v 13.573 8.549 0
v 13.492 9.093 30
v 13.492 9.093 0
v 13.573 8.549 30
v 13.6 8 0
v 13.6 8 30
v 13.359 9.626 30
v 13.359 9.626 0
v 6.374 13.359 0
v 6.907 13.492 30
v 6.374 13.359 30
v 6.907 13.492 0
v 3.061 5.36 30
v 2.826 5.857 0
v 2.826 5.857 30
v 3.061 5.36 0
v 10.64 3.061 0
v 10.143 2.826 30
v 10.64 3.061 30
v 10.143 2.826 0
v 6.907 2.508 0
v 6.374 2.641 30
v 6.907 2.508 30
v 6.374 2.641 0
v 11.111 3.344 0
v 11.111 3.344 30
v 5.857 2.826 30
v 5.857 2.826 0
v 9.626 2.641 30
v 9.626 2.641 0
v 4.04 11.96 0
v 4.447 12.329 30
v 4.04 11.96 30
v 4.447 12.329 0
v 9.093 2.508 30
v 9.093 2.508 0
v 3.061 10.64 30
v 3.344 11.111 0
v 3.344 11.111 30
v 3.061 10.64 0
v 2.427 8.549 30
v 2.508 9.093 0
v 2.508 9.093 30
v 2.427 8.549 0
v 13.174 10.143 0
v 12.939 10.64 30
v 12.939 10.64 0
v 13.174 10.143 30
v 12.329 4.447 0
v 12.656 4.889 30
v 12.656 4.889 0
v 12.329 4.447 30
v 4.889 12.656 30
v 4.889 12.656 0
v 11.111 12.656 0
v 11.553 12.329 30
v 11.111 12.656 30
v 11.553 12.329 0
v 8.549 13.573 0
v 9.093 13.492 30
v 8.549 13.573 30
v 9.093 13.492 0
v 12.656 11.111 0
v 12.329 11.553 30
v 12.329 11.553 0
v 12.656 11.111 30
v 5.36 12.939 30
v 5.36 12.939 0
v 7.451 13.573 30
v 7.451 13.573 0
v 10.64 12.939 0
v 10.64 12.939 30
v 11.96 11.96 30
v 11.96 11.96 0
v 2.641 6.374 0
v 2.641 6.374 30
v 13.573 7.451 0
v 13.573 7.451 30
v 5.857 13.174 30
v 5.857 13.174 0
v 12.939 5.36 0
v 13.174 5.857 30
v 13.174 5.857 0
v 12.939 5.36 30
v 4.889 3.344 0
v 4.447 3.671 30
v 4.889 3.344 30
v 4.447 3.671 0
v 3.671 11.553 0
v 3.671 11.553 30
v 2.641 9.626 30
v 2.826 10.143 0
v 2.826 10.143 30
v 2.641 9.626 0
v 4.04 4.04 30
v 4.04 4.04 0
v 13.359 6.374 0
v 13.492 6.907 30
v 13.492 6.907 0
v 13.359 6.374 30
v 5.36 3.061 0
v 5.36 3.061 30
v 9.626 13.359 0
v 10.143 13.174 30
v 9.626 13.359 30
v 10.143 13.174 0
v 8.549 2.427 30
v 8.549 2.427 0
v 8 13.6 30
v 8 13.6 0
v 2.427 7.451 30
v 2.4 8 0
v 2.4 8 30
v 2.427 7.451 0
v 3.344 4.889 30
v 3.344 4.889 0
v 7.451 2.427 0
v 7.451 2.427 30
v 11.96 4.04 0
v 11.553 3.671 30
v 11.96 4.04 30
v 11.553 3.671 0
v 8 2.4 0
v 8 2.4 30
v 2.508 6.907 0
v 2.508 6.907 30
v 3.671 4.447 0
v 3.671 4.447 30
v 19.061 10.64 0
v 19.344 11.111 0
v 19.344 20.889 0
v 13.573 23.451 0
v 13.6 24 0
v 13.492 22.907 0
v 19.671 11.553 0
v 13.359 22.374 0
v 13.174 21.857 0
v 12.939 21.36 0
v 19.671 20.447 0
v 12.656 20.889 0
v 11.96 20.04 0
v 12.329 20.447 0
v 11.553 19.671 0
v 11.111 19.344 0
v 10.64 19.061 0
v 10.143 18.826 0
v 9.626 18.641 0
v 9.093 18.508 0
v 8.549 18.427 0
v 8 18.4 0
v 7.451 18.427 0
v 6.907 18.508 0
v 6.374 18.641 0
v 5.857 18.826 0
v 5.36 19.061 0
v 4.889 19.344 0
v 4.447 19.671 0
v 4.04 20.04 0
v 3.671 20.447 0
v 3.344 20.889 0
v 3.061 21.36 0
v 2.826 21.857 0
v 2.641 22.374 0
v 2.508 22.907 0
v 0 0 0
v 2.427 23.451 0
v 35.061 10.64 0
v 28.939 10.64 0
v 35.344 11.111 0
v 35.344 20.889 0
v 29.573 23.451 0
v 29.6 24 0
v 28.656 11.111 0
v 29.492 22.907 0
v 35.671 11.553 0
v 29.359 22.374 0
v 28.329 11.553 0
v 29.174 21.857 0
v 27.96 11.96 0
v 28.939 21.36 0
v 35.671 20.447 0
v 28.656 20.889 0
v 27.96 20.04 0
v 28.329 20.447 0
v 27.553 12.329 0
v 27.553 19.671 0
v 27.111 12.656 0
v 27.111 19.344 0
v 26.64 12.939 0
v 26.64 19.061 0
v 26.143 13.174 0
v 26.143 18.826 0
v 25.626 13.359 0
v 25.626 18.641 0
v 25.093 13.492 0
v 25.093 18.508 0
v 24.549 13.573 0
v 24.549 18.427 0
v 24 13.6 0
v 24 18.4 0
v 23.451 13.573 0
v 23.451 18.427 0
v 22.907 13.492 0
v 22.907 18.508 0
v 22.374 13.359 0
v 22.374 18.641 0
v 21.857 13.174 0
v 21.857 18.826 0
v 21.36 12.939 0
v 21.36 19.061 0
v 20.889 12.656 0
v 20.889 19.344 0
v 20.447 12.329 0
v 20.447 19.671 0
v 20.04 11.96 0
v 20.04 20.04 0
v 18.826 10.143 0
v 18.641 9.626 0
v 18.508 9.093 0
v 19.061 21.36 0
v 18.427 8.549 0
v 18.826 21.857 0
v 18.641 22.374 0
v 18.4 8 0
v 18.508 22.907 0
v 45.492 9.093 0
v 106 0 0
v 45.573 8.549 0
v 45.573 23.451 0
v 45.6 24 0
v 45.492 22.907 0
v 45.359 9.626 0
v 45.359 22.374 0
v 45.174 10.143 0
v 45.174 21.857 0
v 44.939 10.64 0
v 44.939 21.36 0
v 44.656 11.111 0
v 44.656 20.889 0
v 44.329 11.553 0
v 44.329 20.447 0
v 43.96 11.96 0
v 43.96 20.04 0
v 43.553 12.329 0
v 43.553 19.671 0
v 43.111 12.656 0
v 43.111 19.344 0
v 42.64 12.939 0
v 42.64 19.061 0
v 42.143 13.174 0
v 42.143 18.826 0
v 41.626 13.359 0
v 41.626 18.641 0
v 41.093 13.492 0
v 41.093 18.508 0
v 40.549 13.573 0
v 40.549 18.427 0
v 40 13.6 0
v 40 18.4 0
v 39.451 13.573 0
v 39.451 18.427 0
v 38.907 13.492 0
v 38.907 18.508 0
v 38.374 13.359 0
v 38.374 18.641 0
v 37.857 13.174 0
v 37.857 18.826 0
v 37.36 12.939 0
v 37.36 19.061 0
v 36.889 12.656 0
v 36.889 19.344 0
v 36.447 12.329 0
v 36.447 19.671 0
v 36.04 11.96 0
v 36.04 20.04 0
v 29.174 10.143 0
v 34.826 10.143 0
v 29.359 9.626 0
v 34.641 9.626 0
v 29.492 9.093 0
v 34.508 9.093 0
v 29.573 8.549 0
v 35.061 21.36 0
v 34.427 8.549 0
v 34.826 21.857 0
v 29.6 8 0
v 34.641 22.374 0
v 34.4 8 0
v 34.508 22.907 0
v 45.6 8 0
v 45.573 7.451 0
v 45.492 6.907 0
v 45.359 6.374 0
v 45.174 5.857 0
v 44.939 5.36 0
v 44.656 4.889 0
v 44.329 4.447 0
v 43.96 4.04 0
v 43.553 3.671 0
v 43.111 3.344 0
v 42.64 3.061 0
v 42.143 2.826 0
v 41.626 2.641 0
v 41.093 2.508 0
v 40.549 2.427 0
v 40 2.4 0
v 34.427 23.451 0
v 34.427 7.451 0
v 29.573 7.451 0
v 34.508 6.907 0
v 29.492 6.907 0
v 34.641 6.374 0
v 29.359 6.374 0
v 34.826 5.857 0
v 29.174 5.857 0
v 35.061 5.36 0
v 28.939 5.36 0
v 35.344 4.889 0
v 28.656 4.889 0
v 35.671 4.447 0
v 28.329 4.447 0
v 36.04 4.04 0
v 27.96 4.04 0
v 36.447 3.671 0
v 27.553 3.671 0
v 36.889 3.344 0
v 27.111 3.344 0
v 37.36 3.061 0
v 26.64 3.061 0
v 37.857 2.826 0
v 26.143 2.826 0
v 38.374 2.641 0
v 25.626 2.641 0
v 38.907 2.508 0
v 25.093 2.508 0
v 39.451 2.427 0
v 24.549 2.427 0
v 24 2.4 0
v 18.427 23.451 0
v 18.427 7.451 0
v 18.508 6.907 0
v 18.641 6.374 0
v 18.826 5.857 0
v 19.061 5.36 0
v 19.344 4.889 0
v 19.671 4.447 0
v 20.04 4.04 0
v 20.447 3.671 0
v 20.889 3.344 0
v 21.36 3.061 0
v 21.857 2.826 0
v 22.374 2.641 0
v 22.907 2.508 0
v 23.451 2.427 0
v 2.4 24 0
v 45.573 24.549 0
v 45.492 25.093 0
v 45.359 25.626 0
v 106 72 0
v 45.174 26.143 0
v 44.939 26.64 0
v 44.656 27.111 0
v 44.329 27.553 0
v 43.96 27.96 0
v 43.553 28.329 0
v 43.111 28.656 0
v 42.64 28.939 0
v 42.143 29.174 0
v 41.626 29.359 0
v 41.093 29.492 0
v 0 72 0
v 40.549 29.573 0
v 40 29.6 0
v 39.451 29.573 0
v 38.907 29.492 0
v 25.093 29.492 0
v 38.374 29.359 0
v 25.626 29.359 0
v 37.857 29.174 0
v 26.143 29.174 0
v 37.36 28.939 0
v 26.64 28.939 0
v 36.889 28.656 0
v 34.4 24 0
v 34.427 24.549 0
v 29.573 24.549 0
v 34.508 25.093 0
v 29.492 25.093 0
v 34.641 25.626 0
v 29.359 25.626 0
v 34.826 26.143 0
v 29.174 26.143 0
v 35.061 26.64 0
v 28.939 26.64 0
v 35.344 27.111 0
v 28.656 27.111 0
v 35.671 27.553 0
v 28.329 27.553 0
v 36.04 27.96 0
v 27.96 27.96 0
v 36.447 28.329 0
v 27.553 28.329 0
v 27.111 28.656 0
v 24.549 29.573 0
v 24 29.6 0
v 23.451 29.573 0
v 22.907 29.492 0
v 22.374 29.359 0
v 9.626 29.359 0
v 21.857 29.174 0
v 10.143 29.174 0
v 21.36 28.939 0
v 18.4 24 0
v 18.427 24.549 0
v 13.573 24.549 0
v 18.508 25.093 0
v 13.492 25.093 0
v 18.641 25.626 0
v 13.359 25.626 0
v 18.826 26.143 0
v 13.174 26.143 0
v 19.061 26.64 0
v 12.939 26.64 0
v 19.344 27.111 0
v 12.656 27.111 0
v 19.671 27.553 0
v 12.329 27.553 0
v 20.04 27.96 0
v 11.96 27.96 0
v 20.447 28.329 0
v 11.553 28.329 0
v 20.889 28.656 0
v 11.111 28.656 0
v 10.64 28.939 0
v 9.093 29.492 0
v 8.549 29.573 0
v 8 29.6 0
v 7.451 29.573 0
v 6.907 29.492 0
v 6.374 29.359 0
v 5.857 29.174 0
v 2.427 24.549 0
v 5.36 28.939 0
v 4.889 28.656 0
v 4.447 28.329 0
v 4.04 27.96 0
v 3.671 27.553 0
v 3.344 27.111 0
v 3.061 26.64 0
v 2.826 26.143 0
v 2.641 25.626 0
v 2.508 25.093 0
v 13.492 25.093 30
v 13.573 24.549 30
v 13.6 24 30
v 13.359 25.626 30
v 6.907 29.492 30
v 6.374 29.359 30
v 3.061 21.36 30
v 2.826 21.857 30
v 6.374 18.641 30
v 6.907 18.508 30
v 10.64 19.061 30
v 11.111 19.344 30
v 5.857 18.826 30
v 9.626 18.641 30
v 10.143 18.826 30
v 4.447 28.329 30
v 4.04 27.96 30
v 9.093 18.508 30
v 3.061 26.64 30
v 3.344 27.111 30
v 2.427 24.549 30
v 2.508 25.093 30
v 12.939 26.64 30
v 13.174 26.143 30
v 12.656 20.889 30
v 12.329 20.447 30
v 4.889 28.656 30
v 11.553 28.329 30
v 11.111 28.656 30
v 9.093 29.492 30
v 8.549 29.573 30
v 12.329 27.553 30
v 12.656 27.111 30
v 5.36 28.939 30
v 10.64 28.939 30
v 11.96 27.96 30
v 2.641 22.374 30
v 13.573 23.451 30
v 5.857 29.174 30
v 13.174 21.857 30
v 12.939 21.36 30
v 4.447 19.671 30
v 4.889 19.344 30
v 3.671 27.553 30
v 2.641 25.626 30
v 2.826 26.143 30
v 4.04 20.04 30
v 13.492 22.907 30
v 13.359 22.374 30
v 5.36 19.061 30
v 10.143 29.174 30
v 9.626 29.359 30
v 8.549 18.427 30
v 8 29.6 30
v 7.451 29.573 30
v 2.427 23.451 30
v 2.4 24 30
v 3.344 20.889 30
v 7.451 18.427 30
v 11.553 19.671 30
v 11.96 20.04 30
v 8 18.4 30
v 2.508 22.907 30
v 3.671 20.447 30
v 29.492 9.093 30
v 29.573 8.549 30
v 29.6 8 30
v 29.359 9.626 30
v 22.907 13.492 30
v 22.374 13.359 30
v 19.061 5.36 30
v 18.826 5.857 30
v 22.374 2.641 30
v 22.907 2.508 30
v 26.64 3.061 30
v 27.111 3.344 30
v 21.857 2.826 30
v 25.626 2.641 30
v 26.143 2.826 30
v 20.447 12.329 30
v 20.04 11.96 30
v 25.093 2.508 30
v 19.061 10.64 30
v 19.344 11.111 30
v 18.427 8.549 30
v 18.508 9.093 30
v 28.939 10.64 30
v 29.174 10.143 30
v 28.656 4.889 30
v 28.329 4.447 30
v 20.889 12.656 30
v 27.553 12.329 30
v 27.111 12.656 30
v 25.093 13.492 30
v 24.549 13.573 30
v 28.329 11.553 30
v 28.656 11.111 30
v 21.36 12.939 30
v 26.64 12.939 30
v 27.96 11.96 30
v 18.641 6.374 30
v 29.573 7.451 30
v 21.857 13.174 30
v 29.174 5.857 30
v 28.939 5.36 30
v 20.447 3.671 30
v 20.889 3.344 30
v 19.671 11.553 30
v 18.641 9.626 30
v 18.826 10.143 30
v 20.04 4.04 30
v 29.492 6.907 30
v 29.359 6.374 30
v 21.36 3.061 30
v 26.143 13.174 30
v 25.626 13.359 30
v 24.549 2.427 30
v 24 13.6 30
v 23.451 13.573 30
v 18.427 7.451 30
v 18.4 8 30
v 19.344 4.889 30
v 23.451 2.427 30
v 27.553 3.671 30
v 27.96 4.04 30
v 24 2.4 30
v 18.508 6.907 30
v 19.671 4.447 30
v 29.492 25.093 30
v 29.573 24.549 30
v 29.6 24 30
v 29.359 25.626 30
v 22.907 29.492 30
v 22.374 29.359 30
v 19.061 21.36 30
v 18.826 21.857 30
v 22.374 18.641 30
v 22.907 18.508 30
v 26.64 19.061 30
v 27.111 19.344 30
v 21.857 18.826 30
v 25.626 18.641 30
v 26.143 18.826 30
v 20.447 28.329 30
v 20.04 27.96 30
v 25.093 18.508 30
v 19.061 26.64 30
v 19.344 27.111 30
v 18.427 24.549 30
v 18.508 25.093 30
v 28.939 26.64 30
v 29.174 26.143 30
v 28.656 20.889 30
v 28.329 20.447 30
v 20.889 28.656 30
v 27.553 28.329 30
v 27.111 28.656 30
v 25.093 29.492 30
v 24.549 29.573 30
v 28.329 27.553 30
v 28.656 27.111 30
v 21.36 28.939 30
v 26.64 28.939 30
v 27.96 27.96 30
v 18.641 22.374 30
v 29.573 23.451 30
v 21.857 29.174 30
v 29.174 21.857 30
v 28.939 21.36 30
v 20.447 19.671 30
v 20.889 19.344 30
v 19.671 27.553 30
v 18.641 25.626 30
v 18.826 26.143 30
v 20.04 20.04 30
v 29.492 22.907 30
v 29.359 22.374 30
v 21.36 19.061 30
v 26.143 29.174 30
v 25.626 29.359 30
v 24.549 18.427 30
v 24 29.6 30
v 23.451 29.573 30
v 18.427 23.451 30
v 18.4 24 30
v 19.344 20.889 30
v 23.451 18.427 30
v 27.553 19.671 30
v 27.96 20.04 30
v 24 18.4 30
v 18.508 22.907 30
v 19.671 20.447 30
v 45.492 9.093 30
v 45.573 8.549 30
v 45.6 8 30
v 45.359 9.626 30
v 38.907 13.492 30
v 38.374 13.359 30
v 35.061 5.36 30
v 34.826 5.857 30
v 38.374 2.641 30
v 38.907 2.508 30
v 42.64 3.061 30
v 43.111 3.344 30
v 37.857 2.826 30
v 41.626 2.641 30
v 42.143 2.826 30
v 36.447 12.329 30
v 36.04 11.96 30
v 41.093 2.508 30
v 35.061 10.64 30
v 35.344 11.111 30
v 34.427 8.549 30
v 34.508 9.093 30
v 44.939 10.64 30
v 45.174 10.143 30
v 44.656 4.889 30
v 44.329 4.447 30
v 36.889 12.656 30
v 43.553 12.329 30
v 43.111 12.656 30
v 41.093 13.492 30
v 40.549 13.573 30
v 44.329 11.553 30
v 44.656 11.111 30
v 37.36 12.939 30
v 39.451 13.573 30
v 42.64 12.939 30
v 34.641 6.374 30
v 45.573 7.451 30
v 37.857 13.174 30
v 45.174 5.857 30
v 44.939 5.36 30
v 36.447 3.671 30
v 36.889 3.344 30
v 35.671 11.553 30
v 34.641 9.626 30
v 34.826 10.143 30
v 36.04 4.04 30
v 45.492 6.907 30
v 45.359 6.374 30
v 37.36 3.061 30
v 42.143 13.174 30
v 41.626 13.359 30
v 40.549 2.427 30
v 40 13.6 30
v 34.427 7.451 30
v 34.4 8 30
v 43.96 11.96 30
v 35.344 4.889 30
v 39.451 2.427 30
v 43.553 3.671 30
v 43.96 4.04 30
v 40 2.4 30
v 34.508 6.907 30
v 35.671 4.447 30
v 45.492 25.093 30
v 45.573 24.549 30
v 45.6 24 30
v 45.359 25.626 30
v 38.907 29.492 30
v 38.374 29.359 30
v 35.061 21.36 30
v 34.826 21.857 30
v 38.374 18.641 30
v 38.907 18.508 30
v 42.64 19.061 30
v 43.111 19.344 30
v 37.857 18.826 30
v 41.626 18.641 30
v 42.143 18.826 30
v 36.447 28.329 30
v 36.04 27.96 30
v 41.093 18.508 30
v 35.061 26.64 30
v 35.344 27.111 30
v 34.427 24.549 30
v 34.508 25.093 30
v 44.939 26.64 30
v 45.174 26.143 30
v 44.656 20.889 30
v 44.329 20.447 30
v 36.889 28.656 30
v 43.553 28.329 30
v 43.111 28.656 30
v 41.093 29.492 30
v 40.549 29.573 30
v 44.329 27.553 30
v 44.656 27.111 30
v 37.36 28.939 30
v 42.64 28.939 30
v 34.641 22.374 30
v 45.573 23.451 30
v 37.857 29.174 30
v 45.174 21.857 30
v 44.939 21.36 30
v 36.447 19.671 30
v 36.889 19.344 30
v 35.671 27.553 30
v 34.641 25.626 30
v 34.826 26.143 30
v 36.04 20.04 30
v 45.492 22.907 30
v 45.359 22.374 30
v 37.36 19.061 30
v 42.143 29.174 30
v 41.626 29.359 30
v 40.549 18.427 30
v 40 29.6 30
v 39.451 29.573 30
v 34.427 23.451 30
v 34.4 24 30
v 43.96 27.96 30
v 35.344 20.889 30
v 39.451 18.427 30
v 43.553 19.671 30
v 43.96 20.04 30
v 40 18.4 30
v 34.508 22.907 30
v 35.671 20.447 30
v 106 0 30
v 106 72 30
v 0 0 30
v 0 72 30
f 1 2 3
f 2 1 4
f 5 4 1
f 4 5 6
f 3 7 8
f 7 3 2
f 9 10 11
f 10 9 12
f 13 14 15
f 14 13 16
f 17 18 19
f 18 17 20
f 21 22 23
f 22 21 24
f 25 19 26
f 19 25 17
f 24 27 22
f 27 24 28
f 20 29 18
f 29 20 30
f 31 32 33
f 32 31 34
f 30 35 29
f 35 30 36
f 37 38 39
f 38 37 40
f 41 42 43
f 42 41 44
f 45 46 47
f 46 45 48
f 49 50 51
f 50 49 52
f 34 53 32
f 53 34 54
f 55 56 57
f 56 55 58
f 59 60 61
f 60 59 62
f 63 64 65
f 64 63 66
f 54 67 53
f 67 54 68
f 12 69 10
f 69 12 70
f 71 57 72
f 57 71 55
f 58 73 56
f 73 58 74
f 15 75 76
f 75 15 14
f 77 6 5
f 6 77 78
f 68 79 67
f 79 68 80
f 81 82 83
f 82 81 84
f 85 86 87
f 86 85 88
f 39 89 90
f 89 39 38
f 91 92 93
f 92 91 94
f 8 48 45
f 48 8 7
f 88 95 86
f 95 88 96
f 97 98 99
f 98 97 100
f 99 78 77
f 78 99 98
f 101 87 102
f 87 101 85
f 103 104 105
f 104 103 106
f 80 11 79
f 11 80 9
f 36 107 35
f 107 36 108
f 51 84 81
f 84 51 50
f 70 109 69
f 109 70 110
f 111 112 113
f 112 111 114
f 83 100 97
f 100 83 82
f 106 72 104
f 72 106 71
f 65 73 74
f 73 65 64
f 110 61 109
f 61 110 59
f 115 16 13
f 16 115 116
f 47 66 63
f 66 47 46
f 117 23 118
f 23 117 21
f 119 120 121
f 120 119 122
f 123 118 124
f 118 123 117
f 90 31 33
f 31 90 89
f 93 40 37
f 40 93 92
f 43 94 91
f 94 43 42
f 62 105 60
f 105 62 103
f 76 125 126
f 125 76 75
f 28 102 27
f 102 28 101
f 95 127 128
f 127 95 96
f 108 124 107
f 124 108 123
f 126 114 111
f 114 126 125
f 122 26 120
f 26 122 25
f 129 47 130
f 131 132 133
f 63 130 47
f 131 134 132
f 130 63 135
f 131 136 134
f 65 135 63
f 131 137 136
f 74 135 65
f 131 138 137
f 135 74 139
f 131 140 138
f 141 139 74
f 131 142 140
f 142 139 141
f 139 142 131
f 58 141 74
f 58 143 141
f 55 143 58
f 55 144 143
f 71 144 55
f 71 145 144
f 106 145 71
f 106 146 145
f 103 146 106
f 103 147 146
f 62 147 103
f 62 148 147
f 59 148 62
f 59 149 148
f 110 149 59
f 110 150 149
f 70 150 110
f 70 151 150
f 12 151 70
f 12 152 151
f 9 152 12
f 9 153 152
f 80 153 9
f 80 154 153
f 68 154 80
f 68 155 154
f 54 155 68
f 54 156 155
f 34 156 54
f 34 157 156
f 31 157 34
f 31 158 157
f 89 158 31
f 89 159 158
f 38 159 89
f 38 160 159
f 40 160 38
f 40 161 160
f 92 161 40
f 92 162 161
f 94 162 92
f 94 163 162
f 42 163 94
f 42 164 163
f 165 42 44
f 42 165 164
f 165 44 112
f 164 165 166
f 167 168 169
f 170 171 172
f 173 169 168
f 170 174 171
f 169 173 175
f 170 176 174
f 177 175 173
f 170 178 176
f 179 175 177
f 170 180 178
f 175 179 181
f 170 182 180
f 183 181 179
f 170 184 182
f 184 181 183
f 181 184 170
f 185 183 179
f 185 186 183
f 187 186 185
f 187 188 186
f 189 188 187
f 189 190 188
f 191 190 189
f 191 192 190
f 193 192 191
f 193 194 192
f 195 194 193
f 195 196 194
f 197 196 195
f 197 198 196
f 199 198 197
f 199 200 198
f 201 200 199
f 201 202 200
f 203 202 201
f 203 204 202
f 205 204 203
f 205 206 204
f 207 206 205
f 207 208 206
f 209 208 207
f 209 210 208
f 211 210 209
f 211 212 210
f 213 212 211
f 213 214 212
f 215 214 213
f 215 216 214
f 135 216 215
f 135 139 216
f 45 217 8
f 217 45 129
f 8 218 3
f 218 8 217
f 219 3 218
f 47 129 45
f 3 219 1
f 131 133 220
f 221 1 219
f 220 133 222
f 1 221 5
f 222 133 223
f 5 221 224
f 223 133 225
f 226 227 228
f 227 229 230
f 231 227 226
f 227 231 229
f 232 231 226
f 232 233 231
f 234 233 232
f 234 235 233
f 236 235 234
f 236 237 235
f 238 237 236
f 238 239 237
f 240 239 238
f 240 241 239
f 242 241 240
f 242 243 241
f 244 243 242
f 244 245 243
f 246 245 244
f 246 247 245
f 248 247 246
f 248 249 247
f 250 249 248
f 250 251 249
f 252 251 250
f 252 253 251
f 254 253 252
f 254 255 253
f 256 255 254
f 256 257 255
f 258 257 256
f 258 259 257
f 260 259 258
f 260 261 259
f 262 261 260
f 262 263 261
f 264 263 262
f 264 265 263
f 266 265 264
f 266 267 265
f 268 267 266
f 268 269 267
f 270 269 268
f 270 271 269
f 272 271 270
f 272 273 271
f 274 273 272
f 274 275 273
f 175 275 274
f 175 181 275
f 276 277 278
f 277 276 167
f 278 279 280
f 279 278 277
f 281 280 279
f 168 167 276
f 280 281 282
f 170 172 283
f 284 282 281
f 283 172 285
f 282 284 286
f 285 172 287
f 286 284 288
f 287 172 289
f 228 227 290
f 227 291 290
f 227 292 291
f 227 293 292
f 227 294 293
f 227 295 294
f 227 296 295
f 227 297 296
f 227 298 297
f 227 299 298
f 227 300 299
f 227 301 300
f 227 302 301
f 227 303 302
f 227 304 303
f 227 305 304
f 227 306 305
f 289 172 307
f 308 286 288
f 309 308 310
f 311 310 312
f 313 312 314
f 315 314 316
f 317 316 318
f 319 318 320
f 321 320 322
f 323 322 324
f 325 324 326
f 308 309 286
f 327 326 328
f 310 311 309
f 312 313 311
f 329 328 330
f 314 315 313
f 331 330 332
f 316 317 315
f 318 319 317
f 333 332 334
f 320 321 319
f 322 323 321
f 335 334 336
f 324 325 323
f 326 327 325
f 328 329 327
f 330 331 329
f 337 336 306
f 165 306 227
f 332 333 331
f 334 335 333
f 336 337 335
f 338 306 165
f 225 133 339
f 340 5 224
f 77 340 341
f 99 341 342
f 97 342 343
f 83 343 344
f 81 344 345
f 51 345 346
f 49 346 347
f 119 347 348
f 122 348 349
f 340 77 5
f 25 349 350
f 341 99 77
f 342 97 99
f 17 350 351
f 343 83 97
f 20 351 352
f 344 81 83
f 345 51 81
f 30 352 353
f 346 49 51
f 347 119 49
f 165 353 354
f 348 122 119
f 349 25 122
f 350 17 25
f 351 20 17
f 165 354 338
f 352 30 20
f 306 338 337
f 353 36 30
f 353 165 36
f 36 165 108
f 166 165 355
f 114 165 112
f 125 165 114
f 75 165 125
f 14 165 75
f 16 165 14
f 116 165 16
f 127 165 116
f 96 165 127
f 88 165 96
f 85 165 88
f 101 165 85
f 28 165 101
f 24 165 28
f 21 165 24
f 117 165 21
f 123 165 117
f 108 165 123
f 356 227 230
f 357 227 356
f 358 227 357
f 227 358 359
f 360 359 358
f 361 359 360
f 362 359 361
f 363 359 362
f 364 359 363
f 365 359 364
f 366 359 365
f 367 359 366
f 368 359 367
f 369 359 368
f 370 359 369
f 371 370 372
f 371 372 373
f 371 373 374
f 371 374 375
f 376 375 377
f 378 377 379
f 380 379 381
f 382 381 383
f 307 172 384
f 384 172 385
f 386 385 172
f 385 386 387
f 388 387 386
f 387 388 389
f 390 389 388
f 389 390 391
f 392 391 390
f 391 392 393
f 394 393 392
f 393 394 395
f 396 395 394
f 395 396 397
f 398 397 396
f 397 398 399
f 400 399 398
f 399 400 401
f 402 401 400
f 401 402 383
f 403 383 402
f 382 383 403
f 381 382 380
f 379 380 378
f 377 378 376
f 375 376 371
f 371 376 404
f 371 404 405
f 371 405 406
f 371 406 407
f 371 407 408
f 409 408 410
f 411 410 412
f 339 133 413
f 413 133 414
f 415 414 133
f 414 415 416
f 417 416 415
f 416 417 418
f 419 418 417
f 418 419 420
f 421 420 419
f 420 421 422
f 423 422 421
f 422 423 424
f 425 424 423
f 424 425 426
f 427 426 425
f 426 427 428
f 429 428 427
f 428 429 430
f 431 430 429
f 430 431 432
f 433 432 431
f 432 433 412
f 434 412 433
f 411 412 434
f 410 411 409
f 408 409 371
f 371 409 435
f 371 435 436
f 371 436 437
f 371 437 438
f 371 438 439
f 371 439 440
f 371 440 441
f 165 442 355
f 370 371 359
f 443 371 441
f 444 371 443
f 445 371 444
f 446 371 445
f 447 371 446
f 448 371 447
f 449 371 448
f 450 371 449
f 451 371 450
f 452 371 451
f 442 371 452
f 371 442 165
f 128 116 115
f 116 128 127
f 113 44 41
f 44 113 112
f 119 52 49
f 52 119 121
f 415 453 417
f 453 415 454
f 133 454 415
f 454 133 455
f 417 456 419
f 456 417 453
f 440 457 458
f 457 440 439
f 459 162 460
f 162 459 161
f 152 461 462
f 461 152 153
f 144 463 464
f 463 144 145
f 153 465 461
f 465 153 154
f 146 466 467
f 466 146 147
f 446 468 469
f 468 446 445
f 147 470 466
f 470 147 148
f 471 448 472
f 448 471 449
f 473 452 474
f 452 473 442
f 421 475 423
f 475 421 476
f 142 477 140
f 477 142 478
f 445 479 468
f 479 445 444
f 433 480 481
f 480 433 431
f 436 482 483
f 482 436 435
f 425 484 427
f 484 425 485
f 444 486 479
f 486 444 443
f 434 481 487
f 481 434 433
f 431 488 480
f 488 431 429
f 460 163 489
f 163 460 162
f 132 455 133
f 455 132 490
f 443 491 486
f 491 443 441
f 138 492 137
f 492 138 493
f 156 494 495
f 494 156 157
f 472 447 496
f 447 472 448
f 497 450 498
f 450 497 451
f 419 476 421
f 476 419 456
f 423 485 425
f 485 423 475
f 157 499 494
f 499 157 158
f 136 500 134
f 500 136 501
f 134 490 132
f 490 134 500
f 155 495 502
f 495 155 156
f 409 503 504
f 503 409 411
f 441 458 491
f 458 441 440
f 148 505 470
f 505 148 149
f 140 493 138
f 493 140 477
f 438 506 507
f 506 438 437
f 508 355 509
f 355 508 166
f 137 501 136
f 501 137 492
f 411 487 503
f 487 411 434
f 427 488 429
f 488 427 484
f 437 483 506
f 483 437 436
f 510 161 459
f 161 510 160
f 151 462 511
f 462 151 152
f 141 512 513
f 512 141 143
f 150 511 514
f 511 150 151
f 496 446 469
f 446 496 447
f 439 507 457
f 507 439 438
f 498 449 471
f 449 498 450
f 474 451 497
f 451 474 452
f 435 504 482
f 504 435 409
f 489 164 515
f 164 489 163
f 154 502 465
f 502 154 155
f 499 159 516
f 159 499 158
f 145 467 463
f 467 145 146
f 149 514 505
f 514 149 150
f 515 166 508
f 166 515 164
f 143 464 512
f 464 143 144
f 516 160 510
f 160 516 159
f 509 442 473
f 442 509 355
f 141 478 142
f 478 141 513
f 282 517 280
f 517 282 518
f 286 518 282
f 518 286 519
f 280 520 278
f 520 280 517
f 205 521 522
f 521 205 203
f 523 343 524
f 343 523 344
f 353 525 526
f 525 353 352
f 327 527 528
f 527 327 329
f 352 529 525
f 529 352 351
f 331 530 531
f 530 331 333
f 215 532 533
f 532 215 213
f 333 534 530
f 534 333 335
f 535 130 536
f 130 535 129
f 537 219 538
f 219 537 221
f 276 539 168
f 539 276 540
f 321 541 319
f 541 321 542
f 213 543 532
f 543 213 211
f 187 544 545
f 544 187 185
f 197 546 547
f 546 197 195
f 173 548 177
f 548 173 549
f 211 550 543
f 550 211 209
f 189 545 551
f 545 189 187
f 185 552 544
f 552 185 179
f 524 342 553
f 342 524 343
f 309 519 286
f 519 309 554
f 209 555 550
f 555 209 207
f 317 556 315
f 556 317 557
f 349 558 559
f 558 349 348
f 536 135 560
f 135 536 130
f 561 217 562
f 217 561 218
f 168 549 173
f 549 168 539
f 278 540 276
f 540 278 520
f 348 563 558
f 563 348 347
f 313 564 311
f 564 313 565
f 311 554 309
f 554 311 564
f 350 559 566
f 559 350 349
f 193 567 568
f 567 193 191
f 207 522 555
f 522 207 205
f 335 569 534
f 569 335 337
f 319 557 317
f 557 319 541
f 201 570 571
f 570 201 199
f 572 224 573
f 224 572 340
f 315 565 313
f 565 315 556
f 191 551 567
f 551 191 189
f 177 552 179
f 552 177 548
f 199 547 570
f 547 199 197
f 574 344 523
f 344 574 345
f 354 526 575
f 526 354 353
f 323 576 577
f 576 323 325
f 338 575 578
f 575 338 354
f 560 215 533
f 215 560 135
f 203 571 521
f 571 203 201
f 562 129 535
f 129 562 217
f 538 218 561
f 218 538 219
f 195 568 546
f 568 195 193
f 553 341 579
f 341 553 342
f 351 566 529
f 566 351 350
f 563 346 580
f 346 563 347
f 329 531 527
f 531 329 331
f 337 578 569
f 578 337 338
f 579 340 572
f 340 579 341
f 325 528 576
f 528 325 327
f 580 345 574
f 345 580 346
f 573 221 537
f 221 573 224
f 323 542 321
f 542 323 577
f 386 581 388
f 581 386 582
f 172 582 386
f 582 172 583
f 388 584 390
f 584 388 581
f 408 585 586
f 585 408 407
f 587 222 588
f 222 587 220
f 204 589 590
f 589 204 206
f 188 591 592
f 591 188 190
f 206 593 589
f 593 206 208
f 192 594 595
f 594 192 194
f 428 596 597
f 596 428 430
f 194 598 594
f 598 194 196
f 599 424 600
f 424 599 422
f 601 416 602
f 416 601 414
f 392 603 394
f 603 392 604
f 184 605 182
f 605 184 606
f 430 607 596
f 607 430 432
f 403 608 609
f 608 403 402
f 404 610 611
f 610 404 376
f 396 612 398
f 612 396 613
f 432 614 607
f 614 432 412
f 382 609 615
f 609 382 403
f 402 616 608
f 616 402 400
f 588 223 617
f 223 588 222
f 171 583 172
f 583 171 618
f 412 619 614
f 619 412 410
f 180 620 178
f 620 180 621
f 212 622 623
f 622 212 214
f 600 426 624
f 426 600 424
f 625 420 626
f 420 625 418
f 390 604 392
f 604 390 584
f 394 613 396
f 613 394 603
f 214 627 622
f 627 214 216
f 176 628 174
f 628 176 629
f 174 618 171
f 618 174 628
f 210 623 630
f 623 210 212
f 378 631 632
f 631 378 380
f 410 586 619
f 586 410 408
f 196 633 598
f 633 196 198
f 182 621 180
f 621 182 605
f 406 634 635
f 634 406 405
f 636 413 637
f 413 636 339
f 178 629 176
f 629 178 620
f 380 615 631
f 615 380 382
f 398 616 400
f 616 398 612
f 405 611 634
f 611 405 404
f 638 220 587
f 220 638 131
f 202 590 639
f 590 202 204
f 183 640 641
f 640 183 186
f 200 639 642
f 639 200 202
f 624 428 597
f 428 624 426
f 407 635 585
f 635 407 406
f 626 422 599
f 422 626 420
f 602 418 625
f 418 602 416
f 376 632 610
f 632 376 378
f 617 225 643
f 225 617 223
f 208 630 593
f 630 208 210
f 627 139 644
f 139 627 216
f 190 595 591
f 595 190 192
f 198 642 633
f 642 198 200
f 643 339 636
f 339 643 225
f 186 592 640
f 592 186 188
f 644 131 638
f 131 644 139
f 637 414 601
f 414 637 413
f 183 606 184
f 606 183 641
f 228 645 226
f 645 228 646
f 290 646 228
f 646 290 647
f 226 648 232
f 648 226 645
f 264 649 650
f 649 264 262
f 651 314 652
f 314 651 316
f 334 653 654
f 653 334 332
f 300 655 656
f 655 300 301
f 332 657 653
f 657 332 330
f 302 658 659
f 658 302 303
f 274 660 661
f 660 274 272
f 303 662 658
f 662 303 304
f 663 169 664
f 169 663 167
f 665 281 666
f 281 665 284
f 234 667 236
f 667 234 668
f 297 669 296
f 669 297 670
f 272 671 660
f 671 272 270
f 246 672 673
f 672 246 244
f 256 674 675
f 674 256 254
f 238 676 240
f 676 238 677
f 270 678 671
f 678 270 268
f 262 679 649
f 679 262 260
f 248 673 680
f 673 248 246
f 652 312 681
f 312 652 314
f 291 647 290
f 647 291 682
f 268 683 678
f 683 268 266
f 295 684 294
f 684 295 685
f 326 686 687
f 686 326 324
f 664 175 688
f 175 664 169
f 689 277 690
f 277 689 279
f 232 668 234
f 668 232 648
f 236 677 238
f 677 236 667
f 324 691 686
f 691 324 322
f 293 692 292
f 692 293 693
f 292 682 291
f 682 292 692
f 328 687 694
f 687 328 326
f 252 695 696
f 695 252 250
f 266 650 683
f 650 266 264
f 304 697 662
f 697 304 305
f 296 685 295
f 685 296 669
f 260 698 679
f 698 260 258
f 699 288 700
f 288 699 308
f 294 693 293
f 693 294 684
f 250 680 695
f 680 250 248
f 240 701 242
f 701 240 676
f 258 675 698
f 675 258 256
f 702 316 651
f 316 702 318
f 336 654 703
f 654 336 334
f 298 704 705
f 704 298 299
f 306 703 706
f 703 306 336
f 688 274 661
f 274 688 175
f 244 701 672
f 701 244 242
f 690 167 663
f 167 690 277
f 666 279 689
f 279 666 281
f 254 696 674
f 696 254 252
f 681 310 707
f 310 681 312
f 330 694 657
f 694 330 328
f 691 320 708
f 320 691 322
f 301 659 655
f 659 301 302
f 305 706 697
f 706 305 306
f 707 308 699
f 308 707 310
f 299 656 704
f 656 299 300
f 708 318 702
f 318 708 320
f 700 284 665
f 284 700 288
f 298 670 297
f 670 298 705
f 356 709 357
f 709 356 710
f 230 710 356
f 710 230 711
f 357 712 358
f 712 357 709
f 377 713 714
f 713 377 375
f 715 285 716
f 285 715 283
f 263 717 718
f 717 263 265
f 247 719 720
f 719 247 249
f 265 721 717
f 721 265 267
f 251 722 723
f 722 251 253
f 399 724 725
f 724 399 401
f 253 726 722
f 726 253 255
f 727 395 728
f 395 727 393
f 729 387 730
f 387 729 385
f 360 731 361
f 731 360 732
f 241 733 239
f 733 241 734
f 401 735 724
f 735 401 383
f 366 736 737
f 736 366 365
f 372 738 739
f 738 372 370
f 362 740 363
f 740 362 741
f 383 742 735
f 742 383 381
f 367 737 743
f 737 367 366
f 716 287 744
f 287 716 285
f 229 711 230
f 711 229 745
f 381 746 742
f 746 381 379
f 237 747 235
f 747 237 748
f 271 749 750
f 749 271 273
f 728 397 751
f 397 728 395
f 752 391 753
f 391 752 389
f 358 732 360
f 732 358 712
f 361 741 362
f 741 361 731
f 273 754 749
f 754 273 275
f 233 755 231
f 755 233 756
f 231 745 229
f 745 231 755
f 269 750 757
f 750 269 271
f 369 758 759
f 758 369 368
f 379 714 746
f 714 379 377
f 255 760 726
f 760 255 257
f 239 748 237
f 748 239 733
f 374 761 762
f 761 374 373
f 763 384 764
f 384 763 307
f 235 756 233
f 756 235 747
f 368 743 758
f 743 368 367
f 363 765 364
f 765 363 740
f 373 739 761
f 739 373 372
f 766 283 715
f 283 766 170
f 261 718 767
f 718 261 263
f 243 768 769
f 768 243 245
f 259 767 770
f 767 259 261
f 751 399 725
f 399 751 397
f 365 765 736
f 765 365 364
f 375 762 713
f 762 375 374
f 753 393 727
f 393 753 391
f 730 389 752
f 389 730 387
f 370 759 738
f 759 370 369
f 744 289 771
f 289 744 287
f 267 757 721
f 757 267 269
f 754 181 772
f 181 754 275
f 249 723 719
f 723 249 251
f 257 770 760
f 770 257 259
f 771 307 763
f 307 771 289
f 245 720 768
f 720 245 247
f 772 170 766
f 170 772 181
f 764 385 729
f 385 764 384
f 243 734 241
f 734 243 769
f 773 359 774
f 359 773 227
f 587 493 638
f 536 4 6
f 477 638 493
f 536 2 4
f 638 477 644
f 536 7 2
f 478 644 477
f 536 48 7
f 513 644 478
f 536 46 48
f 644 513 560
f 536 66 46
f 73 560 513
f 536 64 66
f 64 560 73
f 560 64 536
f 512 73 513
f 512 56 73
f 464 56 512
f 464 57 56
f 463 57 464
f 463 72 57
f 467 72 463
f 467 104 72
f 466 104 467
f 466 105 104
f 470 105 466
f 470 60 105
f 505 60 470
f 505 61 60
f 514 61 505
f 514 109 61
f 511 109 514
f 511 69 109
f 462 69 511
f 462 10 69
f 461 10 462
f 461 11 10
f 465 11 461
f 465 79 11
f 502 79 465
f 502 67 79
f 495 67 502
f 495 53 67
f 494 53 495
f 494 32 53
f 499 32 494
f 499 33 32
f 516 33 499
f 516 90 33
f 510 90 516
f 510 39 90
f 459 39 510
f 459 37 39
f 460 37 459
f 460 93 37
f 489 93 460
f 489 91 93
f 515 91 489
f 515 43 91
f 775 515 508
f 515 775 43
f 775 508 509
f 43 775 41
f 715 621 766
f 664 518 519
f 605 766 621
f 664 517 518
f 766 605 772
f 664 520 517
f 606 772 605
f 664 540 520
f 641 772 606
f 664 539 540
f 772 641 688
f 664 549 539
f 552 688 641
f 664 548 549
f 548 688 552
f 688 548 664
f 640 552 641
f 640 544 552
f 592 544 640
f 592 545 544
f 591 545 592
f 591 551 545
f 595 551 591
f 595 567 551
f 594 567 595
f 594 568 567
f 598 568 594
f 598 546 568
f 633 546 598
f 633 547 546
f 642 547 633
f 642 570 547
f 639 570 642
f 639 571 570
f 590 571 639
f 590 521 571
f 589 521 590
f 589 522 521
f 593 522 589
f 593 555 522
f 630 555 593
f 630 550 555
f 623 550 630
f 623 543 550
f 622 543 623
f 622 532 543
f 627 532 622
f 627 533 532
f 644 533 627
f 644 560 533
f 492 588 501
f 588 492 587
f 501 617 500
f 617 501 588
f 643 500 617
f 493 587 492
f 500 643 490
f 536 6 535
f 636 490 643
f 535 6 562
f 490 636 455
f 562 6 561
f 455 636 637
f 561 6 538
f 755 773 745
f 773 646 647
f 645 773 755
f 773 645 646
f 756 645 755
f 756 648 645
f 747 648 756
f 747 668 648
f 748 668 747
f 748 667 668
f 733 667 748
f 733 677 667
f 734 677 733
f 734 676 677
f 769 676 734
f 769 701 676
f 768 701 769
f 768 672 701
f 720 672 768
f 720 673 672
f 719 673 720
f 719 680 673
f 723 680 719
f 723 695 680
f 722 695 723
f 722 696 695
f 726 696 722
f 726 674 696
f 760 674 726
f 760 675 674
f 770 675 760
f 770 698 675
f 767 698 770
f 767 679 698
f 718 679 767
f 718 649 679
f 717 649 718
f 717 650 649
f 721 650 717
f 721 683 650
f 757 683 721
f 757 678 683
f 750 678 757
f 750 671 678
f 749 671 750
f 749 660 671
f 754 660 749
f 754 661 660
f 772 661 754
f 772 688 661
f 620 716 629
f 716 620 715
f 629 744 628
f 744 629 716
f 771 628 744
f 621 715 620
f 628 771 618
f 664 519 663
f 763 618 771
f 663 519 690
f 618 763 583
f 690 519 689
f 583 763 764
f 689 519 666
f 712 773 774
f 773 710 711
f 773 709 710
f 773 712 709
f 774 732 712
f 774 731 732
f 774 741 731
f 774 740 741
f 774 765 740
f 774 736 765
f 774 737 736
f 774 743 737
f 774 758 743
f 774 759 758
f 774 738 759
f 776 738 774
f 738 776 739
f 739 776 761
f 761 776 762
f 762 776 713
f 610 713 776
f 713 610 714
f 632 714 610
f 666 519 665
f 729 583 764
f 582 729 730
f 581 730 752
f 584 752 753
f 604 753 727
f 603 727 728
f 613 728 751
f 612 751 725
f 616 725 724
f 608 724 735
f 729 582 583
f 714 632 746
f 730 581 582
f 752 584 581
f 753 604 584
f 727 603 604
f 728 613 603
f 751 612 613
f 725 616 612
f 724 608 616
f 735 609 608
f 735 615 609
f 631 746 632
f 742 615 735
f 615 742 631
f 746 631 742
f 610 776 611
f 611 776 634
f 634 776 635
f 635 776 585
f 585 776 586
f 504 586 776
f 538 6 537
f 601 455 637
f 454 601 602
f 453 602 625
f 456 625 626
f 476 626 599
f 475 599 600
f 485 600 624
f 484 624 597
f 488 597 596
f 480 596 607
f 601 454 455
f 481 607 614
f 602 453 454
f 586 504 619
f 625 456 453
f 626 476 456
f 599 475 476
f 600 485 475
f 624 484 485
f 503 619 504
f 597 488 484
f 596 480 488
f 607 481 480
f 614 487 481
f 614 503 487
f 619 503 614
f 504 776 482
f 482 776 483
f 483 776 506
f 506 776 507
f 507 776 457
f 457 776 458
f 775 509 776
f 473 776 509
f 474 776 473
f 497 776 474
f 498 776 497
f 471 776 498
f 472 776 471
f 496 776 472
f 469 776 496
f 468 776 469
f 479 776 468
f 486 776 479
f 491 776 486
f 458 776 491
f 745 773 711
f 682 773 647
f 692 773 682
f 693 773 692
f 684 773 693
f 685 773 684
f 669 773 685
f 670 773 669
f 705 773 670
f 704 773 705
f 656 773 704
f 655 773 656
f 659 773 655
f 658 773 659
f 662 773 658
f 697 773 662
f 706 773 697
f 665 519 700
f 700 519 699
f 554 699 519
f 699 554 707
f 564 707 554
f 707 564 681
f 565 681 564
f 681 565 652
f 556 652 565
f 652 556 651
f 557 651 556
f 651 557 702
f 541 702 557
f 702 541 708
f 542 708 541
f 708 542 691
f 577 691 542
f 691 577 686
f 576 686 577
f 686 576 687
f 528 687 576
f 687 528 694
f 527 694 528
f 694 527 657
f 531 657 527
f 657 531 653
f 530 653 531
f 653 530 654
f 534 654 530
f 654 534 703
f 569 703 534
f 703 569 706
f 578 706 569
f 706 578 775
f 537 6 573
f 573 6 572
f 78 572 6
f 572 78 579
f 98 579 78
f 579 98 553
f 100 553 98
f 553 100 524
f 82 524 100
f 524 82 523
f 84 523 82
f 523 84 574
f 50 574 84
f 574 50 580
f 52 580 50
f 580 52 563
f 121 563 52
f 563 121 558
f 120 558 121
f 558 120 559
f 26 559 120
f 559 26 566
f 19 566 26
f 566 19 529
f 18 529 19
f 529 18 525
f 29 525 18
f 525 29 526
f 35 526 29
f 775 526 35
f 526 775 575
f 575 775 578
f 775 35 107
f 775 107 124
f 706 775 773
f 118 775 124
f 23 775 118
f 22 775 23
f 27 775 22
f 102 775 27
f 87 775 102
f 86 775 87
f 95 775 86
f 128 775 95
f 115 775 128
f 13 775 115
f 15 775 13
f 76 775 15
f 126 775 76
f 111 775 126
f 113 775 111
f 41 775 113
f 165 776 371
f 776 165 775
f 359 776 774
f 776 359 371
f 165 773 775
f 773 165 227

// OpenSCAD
// Bench rack for 1.5 mL microcentrifuge tubes
// Dimensions and parameters
block_length = 106;    // X dimension (mm)
block_width  = 72;     // Y dimension (mm)
block_height = 30;     // Z dimension (mm)
hole_diameter = 11.2;  // Hole diameter (mm)
hole_depth = 25;       // Hole depth (mm)
floor_thickness = 5;   // Solid floor thickness (mm)
rows = 4;              // Number of rows (along Y)
cols = 6;              // Number of columns (along X)
hole_pitch_x = 16;     // Centre-to-centre spacing in X (mm)
hole_pitch_y = 16;     // Centre-to-centre spacing in Y (mm)

// Calculate hole positions (centred on block)
// Total grid dimensions
grid_width_x = (cols - 1) * hole_pitch_x;
grid_width_y = (rows - 1) * hole_pitch_y;

// Offset from block centre to first hole centre
offset_x = -grid_width_x / 2;
offset_y = -grid_width_y / 2;

// Hole height (from bottom of block)
hole_bottom_z = floor_thickness;
hole_top_z = hole_bottom_z + hole_depth;

// Block centre offsets
block_half_x = block_length / 2;
block_half_y = block_width / 2;

// Set resolution for smooth curves
$fn = 64;

module block_with_holes() {
    difference() {
        // Base block
        cube([block_length, block_width, block_height]);
        
        // Cut holes
        for (i = [0 : cols - 1]) {
            for (j = [0 : rows - 1]) {
                // Calculate hole position
                hole_x = offset_x + i * hole_pitch_x;
                hole_y = offset_y + j * hole_pitch_y;
                
                // Translate hole to position
                translate([hole_x, hole_y, 0]) {
                    // Cylinder for hole (extends through block + extra for clean cut)
                    cylinder(h = block_height + 1, r = hole_diameter / 2, center = false);
                }
            }
        }
    }
}

// Build the rack
block_with_holes();
